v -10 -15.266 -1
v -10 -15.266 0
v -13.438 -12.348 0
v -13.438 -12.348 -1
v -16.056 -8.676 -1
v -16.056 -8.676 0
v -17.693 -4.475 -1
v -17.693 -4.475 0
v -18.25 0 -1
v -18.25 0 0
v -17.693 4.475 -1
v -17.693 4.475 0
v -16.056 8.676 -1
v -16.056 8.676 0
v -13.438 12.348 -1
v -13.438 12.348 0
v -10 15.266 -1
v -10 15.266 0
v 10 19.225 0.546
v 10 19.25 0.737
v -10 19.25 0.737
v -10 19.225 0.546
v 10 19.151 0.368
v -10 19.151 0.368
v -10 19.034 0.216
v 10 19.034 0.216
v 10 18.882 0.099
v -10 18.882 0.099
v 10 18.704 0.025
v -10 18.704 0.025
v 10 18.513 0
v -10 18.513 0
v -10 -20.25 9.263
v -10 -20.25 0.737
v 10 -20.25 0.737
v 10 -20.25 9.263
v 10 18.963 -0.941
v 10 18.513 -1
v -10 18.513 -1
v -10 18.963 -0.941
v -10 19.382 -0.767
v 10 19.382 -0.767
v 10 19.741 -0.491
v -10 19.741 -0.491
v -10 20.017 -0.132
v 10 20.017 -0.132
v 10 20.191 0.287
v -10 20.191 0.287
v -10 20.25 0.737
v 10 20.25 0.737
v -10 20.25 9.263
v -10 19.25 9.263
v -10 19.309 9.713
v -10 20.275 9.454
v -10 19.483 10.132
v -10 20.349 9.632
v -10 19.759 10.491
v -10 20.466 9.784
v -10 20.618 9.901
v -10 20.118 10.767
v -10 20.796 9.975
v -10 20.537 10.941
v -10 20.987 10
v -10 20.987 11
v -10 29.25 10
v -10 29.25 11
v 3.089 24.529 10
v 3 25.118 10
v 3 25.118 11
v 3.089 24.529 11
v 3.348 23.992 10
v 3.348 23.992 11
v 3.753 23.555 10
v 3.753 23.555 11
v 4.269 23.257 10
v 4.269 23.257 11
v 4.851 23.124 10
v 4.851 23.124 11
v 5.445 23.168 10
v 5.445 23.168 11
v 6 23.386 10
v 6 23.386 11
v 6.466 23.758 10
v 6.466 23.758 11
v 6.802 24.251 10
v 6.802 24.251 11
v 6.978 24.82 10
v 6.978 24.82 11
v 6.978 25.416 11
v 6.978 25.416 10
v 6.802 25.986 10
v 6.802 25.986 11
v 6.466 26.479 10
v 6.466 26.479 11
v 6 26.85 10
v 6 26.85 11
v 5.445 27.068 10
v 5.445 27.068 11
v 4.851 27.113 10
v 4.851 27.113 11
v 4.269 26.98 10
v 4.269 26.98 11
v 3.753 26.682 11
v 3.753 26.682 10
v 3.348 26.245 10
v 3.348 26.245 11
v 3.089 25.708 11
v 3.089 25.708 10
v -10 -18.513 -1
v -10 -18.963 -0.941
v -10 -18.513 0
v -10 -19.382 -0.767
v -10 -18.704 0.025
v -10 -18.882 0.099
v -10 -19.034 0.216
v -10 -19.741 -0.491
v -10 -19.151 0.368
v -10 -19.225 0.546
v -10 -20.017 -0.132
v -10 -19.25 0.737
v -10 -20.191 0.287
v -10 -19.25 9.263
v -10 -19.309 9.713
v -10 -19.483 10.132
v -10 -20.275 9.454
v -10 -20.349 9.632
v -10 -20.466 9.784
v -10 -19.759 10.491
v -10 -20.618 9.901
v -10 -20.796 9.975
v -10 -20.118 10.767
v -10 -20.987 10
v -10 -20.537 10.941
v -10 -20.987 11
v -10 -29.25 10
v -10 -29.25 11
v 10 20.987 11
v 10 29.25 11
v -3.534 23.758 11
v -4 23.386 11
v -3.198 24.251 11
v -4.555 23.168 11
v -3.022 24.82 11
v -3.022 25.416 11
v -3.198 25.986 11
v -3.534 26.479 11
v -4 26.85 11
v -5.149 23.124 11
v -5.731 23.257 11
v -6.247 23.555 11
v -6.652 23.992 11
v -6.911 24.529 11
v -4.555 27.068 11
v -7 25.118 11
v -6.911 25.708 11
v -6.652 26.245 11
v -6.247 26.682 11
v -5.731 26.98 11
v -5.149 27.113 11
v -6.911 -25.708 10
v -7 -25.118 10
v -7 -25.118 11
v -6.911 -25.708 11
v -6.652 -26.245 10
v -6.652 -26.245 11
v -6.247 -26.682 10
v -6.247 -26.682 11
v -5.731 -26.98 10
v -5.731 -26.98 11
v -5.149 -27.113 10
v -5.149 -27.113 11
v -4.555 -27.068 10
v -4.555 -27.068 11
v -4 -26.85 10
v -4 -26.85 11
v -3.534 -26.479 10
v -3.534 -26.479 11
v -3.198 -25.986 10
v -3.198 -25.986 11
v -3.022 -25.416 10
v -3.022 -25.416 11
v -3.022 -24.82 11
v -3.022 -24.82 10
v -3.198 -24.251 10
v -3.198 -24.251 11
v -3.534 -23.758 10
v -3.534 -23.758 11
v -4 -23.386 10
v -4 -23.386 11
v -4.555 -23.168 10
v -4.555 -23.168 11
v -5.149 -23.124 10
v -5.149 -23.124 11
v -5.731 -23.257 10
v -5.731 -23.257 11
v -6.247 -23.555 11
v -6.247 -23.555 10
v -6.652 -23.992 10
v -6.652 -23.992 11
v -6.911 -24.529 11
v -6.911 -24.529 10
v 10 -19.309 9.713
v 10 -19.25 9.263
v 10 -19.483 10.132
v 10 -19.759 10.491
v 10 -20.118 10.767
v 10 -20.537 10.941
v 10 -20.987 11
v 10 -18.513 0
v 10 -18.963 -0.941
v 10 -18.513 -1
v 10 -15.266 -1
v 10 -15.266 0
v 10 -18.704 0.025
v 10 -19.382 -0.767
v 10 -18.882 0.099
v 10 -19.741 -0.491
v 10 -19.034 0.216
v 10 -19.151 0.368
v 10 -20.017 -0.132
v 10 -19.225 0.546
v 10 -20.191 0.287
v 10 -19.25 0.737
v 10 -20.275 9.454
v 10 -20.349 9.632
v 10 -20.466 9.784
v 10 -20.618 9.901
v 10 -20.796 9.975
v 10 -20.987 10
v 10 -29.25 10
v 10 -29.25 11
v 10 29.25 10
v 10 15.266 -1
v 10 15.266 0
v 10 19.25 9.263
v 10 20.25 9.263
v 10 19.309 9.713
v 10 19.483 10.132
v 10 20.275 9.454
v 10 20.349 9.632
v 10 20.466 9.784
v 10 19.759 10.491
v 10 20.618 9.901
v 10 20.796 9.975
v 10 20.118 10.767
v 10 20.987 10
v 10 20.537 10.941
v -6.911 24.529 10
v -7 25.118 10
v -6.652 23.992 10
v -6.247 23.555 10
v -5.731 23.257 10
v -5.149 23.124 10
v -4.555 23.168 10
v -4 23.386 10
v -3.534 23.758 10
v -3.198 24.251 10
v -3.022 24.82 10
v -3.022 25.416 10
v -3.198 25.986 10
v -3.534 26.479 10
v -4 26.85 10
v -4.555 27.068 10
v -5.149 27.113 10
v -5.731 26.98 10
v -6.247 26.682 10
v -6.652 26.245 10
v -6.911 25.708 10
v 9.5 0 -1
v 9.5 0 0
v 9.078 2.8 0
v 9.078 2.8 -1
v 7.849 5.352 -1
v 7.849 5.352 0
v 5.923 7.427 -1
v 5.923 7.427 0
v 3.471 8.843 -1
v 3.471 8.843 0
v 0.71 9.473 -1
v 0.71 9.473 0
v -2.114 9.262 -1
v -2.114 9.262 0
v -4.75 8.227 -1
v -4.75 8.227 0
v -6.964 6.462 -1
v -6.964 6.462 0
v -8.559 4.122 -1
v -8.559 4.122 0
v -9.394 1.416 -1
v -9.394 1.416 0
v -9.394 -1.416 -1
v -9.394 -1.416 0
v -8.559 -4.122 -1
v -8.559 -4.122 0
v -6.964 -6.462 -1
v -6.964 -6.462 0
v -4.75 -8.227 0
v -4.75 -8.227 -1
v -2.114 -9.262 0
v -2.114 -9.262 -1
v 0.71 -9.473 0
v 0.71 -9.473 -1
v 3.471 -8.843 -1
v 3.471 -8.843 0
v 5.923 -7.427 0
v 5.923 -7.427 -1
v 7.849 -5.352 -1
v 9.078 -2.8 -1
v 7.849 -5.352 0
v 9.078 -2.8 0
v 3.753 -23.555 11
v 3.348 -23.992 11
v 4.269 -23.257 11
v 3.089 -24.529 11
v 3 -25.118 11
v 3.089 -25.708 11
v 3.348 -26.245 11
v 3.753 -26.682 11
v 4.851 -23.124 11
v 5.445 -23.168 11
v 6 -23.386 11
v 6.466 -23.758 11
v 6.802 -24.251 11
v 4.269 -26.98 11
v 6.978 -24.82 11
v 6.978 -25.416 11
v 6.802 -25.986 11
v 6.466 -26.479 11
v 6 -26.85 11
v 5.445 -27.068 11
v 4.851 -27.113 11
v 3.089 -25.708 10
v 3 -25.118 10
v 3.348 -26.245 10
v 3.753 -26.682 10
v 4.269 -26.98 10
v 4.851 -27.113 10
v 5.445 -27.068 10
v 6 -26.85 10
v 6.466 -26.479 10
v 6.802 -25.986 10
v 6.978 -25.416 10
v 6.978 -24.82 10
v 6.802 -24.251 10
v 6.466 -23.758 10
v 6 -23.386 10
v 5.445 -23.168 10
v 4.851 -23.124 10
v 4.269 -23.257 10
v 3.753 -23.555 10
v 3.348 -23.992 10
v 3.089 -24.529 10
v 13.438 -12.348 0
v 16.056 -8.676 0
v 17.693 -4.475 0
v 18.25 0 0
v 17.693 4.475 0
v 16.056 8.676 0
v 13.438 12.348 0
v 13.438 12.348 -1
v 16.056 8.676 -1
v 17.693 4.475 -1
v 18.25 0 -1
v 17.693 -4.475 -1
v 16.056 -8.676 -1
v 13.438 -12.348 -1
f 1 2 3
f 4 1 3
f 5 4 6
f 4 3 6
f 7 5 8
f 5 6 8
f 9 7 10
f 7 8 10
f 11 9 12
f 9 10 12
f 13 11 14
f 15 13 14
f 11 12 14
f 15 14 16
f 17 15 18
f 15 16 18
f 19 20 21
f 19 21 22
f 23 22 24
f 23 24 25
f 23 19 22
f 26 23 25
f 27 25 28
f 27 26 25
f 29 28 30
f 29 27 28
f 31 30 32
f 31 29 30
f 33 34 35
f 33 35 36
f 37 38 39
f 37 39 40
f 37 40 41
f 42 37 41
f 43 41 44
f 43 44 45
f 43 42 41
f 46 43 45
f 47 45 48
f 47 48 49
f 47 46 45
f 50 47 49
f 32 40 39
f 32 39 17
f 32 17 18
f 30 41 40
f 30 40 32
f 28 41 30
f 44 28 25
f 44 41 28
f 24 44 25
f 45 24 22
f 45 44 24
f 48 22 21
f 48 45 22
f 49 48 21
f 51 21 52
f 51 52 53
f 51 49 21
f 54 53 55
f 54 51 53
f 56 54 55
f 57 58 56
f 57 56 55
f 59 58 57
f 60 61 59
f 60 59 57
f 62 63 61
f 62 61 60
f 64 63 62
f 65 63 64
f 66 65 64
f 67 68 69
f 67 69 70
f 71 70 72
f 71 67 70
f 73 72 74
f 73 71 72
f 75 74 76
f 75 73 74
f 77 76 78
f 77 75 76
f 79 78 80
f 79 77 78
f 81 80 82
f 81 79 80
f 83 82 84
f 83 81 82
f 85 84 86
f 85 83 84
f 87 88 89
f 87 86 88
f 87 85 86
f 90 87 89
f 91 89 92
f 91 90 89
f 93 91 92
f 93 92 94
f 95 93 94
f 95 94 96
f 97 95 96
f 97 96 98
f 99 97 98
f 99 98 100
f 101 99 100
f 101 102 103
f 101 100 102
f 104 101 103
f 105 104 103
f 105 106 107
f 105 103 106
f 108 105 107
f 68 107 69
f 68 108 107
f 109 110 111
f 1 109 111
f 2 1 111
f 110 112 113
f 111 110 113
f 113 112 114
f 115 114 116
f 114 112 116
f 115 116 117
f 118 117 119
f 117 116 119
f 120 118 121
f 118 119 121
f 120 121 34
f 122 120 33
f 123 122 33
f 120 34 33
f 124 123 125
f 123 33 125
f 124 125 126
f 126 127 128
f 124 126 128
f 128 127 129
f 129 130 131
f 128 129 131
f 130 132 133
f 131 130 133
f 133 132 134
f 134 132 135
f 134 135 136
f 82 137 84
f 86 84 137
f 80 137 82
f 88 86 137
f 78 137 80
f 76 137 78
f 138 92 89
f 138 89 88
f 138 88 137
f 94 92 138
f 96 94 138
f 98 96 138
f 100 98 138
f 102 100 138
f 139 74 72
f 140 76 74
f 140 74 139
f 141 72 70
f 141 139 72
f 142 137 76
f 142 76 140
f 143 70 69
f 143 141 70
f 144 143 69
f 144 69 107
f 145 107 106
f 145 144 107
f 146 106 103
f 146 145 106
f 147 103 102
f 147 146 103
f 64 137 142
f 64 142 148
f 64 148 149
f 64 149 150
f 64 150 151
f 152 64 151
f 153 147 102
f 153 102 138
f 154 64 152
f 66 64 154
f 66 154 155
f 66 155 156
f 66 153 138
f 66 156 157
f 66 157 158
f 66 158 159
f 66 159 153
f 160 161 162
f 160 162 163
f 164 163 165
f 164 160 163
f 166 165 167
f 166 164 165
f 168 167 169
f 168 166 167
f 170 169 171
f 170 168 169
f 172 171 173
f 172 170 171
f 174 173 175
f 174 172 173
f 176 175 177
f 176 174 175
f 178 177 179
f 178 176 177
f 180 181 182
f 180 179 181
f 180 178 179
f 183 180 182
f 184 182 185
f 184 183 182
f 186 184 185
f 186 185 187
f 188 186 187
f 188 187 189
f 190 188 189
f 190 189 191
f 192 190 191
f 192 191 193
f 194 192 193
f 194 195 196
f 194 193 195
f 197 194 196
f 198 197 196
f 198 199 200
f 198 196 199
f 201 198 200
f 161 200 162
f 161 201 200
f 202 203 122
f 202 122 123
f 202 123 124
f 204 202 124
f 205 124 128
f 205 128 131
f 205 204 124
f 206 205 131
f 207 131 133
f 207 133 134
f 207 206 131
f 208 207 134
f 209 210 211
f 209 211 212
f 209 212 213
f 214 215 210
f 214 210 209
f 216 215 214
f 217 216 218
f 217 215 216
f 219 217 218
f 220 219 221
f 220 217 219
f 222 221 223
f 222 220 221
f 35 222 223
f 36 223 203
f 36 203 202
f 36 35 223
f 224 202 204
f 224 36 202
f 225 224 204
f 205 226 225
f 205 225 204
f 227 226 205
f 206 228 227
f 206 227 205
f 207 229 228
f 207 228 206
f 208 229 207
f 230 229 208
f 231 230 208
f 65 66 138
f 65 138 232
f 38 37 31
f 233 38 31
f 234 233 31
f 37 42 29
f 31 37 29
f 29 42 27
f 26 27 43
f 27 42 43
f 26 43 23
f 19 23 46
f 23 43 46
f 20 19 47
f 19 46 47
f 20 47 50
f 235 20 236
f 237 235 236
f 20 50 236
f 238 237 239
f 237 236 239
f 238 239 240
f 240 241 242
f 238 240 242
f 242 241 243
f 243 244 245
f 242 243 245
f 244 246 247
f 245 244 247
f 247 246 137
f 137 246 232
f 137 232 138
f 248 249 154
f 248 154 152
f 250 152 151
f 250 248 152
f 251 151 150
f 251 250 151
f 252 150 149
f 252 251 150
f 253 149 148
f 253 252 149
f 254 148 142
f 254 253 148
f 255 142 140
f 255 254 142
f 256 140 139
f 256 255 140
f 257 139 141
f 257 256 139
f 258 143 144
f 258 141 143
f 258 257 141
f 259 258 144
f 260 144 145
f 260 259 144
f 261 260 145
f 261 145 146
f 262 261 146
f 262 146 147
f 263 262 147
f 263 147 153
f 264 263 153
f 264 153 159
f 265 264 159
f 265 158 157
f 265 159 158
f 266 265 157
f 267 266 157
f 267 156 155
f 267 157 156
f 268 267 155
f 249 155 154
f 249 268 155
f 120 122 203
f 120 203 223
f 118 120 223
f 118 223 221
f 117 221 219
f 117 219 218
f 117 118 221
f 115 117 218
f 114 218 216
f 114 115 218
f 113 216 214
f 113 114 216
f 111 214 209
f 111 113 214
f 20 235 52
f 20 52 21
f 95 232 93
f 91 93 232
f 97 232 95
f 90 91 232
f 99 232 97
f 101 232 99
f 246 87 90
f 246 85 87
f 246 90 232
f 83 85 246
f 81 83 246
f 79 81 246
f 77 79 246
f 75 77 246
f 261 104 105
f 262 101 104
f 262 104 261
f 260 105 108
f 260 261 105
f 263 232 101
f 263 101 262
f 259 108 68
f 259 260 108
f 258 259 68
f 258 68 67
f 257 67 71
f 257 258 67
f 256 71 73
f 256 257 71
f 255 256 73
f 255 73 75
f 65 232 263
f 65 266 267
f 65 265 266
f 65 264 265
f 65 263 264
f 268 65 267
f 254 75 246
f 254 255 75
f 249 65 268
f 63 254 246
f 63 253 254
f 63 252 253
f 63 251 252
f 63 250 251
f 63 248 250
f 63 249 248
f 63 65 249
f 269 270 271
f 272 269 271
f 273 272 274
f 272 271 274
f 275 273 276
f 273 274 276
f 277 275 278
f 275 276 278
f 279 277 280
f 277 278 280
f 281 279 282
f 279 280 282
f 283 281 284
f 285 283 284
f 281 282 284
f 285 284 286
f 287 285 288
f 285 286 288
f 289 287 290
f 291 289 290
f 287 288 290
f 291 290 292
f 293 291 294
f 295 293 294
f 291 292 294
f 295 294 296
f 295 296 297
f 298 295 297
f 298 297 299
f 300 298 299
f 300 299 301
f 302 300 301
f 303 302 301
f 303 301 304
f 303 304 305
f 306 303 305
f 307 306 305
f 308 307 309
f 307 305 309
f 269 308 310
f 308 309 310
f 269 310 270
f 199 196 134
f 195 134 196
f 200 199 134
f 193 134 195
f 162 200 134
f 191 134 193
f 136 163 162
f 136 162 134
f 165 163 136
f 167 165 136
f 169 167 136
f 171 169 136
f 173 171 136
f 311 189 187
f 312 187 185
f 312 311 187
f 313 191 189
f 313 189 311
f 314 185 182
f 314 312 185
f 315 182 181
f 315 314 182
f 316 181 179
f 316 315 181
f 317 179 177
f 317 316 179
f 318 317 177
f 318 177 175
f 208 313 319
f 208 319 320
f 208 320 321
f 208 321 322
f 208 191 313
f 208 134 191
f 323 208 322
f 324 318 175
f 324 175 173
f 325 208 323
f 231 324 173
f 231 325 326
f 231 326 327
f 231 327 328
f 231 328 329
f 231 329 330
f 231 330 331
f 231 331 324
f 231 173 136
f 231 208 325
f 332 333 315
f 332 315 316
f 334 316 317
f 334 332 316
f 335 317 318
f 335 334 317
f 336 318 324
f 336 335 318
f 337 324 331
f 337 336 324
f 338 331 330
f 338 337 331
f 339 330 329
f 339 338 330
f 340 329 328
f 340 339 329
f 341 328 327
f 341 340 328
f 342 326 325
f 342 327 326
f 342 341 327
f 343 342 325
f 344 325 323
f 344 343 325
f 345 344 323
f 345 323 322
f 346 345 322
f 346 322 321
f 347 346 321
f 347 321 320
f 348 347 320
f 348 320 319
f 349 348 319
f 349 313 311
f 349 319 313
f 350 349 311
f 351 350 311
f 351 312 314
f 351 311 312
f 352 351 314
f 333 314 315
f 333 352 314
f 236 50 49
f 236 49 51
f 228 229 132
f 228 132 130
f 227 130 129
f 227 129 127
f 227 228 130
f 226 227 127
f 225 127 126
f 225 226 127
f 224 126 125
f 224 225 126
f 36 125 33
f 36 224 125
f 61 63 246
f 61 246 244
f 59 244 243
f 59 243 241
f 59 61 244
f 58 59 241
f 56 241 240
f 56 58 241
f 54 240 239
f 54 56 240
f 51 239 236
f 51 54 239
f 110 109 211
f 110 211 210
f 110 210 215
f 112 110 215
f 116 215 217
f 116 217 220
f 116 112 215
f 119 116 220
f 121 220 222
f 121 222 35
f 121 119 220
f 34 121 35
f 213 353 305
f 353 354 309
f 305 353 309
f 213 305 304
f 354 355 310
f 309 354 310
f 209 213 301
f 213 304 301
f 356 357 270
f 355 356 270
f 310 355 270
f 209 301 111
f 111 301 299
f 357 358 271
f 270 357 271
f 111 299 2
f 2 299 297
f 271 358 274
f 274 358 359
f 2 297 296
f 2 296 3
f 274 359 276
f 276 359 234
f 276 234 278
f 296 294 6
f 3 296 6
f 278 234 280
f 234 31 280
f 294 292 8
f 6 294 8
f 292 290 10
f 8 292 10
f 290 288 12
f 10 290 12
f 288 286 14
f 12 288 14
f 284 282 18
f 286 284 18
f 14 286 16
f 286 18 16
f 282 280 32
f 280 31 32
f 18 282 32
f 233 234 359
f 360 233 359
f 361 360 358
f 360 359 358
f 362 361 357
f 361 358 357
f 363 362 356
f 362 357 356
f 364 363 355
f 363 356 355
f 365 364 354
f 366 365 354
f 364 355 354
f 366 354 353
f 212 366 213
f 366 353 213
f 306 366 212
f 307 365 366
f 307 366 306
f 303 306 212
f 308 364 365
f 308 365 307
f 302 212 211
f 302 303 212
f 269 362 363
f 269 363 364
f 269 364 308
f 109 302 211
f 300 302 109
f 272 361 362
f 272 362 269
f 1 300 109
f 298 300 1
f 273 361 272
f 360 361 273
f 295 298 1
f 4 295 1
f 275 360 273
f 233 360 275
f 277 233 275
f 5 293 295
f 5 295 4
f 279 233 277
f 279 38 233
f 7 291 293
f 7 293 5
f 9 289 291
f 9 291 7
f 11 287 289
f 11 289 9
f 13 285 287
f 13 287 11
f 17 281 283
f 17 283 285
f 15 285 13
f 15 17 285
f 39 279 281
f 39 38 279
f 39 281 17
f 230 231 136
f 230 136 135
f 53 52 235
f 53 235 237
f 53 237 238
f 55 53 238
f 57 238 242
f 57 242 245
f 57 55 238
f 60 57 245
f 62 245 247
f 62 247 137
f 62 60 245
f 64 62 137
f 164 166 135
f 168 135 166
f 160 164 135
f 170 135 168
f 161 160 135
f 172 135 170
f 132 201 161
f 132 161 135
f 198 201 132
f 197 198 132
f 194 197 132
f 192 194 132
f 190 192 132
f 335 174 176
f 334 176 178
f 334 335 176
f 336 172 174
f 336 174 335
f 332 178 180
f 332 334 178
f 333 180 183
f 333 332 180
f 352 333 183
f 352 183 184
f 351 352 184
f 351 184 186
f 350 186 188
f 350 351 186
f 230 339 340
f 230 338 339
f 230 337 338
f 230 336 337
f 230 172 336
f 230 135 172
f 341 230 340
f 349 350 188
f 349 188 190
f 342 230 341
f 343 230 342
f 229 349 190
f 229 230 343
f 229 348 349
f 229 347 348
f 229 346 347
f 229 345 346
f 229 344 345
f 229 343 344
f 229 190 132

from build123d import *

# Parameters (mm, degrees)
SKETCH_1_R                       = 9.5
SM_BASE_FLANGE_1_DEPTH           = 1
SM_EDGE_FLANGE_1_STRIP_W         = 5.4732
SM_EDGE_FLANGE_1_STRIP_H         = 1
SM_EDGE_FLANGE_1_STRIP_CUT_DEPTH = 20
SM_EDGE_FLANGE_1_DEPTH           = 20
SM_EDGE_FLANGE_2_STRIP_W         = 5.4732
SM_EDGE_FLANGE_2_STRIP_H         = 1
SM_EDGE_FLANGE_2_STRIP_CUT_DEPTH = 20
SM_EDGE_FLANGE_2_DEPTH           = 20
SM_EDGE_FLANGE_3_STRIP_W         = 5.4732
SM_EDGE_FLANGE_3_STRIP_H         = 1
SM_EDGE_FLANGE_3_STRIP_CUT_DEPTH = 20
SM_EDGE_FLANGE_3_DEPTH           = 20
SM_EDGE_FLANGE_4_STRIP_W         = 5.4732
SM_EDGE_FLANGE_4_STRIP_H         = 1
SM_EDGE_FLANGE_4_STRIP_CUT_DEPTH = 20
SM_EDGE_FLANGE_4_DEPTH           = 20
CUT_EXTRUDE_2_DEPTH              = 37.505136625
CUT_EXTRUDE_2_DEPTH_BACK         = 37.505136625
SKETCH_19_R                      = 2


# Sheet-metal steps are written as plain solids
with BuildPart() as part:
    # Sketch 1 → Базовая кромка1 (new body)
    with BuildSketch(Plane.XY):
        with BuildLine():
            Line((-10, 15.266384641), (-10, 20.25))
            Line((-10, 20.25), (10, 20.25))
            Line((10, 20.25), (10, 15.266384641))
            ThreePointArc((10, 15.266384641), (18.25, 0), (10, -15.266384641))
            Line((10, -15.266384641), (10, -20.25))
            Line((10, -20.25), (-10, -20.25))
            Line((-10, -20.25), (-10, -15.266384641))
            ThreePointArc((-10, -15.266384641), (-18.25, 0), (-10, 15.266384641))
        make_face()
        Circle(SKETCH_1_R, mode=Mode.SUBTRACT)
    extrude(amount=-SM_BASE_FLANGE_1_DEPTH)

    # Ребро-кромка1 strip (across the edge) → Ребро-кромка1 strip cut (cut)
    with BuildSketch(Plane(origin=(10, 20.25, 0), x_dir=(0, -1, 0), z_dir=(-1, 0, 0))):
        with Locations((-1, -0.5)):
            Rectangle(SM_EDGE_FLANGE_1_STRIP_W, SM_EDGE_FLANGE_1_STRIP_H)
    extrude(amount=SM_EDGE_FLANGE_1_STRIP_CUT_DEPTH, mode=Mode.SUBTRACT)

    # Ребро-кромка1 section (across the edge) → Ребро-кромка1 (add)
    with BuildSketch(Plane(origin=(10, 20.25, 0), x_dir=(0, -1, 0), z_dir=(-1, 0, 0))):
        with BuildLine():
            Line((0, 0.7366), (0, 11))
            Line((0, 11), (1, 11))
            Line((1, 11), (1, 0.7366))
            ThreePointArc((1, 0.7366), (1.215745145, 0.215745145), (1.7366, 0))
            Line((1.7366, 0), (1.7366, -1))
            ThreePointArc((1.7366, -1), (0.508638364, -0.491361636), (0, 0.7366))
        make_face()
    extrude(amount=SM_EDGE_FLANGE_1_DEPTH)

    # Ребро-кромка2 strip (across the edge) → Ребро-кромка2 strip cut (cut)
    with BuildSketch(Plane(origin=(-10, -20.25, 0), x_dir=(0, 1, 0), z_dir=(1, 0, 0))):
        with Locations((-1, -0.5)):
            Rectangle(SM_EDGE_FLANGE_2_STRIP_W, SM_EDGE_FLANGE_2_STRIP_H)
    extrude(amount=SM_EDGE_FLANGE_2_STRIP_CUT_DEPTH, mode=Mode.SUBTRACT)

    # Ребро-кромка2 section (across the edge) → Ребро-кромка2 (add)
    with BuildSketch(Plane(origin=(-10, -20.25, 0), x_dir=(0, 1, 0), z_dir=(1, 0, 0))):
        with BuildLine():
            Line((0, 0.7366), (0, 11))
            Line((0, 11), (1, 11))
            Line((1, 11), (1, 0.7366))
            ThreePointArc((1, 0.7366), (1.215745145, 0.215745145), (1.7366, 0))
            Line((1.7366, 0), (1.7366, -1))
            ThreePointArc((1.7366, -1), (0.508638364, -0.491361636), (0, 0.7366))
        make_face()
    extrude(amount=SM_EDGE_FLANGE_2_DEPTH)

    # Ребро-кромка3 strip (across the edge) → Ребро-кромка3 strip cut (cut)
    with BuildSketch(Plane(origin=(-10, 20.25, 11), x_dir=(0, 0, -1), z_dir=(1, 0, 0))):
        with Locations((-1, -0.5)):
            Rectangle(SM_EDGE_FLANGE_3_STRIP_W, SM_EDGE_FLANGE_3_STRIP_H)
    extrude(amount=SM_EDGE_FLANGE_3_STRIP_CUT_DEPTH, mode=Mode.SUBTRACT)

    # Ребро-кромка3 section (across the edge) → Ребро-кромка3 (add)
    with BuildSketch(Plane(origin=(-10, 20.25, 11), x_dir=(0, 0, -1), z_dir=(1, 0, 0))):
        with BuildLine():
            Line((0, 0.7366), (0, 9))
            Line((0, 9), (1, 9))
            Line((1, 9), (1, 0.7366))
            ThreePointArc((1, 0.7366), (1.215745145, 0.215745145), (1.7366, 0))
            Line((1.7366, 0), (1.7366, -1))
            ThreePointArc((1.7366, -1), (0.508638364, -0.491361636), (0, 0.7366))
        make_face()
    extrude(amount=SM_EDGE_FLANGE_3_DEPTH)

    # Ребро-кромка4 strip (across the edge) → Ребро-кромка4 strip cut (cut)
    with BuildSketch(Plane(origin=(10, -20.25, 11), x_dir=(0, 0, -1), z_dir=(-1, 0, 0))):
        with Locations((-1, -0.5)):
            Rectangle(SM_EDGE_FLANGE_4_STRIP_W, SM_EDGE_FLANGE_4_STRIP_H)
    extrude(amount=SM_EDGE_FLANGE_4_STRIP_CUT_DEPTH, mode=Mode.SUBTRACT)

    # Ребро-кромка4 section (across the edge) → Ребро-кромка4 (add)
    with BuildSketch(Plane(origin=(10, -20.25, 11), x_dir=(0, 0, -1), z_dir=(-1, 0, 0))):
        with BuildLine():
            Line((0, 0.7366), (0, 9))
            Line((0, 9), (1, 9))
            Line((1, 9), (1, 0.7366))
            ThreePointArc((1, 0.7366), (1.215745145, 0.215745145), (1.7366, 0))
            Line((1.7366, 0), (1.7366, -1))
            ThreePointArc((1.7366, -1), (0.508638364, -0.491361636), (0, 0.7366))
        make_face()
    extrude(amount=SM_EDGE_FLANGE_4_DEPTH)

    # Эскиз19 → Вырез-Вытянуть2 (cut, two sides: drawn at the far end of the back side and taken through both)
    with BuildSketch(Plane.XY.offset(11).offset(-CUT_EXTRUDE_2_DEPTH_BACK)):
        with Locations(Location((-5, 25.1183, 0), (0, 0, 180))):
            Circle(SKETCH_19_R)
        with Locations(Location((5, 25.1183, 0), (0, 0, 180))):
            Circle(SKETCH_19_R)
        with Locations(Location((5, -25.1183, 0), (0, 0, 180))):
            Circle(SKETCH_19_R)
        with Locations(Location((-5, -25.1183, 0), (0, 0, 180))):
            Circle(SKETCH_19_R)
    extrude(amount=CUT_EXTRUDE_2_DEPTH + CUT_EXTRUDE_2_DEPTH_BACK, mode=Mode.SUBTRACT)


solid = part.part
